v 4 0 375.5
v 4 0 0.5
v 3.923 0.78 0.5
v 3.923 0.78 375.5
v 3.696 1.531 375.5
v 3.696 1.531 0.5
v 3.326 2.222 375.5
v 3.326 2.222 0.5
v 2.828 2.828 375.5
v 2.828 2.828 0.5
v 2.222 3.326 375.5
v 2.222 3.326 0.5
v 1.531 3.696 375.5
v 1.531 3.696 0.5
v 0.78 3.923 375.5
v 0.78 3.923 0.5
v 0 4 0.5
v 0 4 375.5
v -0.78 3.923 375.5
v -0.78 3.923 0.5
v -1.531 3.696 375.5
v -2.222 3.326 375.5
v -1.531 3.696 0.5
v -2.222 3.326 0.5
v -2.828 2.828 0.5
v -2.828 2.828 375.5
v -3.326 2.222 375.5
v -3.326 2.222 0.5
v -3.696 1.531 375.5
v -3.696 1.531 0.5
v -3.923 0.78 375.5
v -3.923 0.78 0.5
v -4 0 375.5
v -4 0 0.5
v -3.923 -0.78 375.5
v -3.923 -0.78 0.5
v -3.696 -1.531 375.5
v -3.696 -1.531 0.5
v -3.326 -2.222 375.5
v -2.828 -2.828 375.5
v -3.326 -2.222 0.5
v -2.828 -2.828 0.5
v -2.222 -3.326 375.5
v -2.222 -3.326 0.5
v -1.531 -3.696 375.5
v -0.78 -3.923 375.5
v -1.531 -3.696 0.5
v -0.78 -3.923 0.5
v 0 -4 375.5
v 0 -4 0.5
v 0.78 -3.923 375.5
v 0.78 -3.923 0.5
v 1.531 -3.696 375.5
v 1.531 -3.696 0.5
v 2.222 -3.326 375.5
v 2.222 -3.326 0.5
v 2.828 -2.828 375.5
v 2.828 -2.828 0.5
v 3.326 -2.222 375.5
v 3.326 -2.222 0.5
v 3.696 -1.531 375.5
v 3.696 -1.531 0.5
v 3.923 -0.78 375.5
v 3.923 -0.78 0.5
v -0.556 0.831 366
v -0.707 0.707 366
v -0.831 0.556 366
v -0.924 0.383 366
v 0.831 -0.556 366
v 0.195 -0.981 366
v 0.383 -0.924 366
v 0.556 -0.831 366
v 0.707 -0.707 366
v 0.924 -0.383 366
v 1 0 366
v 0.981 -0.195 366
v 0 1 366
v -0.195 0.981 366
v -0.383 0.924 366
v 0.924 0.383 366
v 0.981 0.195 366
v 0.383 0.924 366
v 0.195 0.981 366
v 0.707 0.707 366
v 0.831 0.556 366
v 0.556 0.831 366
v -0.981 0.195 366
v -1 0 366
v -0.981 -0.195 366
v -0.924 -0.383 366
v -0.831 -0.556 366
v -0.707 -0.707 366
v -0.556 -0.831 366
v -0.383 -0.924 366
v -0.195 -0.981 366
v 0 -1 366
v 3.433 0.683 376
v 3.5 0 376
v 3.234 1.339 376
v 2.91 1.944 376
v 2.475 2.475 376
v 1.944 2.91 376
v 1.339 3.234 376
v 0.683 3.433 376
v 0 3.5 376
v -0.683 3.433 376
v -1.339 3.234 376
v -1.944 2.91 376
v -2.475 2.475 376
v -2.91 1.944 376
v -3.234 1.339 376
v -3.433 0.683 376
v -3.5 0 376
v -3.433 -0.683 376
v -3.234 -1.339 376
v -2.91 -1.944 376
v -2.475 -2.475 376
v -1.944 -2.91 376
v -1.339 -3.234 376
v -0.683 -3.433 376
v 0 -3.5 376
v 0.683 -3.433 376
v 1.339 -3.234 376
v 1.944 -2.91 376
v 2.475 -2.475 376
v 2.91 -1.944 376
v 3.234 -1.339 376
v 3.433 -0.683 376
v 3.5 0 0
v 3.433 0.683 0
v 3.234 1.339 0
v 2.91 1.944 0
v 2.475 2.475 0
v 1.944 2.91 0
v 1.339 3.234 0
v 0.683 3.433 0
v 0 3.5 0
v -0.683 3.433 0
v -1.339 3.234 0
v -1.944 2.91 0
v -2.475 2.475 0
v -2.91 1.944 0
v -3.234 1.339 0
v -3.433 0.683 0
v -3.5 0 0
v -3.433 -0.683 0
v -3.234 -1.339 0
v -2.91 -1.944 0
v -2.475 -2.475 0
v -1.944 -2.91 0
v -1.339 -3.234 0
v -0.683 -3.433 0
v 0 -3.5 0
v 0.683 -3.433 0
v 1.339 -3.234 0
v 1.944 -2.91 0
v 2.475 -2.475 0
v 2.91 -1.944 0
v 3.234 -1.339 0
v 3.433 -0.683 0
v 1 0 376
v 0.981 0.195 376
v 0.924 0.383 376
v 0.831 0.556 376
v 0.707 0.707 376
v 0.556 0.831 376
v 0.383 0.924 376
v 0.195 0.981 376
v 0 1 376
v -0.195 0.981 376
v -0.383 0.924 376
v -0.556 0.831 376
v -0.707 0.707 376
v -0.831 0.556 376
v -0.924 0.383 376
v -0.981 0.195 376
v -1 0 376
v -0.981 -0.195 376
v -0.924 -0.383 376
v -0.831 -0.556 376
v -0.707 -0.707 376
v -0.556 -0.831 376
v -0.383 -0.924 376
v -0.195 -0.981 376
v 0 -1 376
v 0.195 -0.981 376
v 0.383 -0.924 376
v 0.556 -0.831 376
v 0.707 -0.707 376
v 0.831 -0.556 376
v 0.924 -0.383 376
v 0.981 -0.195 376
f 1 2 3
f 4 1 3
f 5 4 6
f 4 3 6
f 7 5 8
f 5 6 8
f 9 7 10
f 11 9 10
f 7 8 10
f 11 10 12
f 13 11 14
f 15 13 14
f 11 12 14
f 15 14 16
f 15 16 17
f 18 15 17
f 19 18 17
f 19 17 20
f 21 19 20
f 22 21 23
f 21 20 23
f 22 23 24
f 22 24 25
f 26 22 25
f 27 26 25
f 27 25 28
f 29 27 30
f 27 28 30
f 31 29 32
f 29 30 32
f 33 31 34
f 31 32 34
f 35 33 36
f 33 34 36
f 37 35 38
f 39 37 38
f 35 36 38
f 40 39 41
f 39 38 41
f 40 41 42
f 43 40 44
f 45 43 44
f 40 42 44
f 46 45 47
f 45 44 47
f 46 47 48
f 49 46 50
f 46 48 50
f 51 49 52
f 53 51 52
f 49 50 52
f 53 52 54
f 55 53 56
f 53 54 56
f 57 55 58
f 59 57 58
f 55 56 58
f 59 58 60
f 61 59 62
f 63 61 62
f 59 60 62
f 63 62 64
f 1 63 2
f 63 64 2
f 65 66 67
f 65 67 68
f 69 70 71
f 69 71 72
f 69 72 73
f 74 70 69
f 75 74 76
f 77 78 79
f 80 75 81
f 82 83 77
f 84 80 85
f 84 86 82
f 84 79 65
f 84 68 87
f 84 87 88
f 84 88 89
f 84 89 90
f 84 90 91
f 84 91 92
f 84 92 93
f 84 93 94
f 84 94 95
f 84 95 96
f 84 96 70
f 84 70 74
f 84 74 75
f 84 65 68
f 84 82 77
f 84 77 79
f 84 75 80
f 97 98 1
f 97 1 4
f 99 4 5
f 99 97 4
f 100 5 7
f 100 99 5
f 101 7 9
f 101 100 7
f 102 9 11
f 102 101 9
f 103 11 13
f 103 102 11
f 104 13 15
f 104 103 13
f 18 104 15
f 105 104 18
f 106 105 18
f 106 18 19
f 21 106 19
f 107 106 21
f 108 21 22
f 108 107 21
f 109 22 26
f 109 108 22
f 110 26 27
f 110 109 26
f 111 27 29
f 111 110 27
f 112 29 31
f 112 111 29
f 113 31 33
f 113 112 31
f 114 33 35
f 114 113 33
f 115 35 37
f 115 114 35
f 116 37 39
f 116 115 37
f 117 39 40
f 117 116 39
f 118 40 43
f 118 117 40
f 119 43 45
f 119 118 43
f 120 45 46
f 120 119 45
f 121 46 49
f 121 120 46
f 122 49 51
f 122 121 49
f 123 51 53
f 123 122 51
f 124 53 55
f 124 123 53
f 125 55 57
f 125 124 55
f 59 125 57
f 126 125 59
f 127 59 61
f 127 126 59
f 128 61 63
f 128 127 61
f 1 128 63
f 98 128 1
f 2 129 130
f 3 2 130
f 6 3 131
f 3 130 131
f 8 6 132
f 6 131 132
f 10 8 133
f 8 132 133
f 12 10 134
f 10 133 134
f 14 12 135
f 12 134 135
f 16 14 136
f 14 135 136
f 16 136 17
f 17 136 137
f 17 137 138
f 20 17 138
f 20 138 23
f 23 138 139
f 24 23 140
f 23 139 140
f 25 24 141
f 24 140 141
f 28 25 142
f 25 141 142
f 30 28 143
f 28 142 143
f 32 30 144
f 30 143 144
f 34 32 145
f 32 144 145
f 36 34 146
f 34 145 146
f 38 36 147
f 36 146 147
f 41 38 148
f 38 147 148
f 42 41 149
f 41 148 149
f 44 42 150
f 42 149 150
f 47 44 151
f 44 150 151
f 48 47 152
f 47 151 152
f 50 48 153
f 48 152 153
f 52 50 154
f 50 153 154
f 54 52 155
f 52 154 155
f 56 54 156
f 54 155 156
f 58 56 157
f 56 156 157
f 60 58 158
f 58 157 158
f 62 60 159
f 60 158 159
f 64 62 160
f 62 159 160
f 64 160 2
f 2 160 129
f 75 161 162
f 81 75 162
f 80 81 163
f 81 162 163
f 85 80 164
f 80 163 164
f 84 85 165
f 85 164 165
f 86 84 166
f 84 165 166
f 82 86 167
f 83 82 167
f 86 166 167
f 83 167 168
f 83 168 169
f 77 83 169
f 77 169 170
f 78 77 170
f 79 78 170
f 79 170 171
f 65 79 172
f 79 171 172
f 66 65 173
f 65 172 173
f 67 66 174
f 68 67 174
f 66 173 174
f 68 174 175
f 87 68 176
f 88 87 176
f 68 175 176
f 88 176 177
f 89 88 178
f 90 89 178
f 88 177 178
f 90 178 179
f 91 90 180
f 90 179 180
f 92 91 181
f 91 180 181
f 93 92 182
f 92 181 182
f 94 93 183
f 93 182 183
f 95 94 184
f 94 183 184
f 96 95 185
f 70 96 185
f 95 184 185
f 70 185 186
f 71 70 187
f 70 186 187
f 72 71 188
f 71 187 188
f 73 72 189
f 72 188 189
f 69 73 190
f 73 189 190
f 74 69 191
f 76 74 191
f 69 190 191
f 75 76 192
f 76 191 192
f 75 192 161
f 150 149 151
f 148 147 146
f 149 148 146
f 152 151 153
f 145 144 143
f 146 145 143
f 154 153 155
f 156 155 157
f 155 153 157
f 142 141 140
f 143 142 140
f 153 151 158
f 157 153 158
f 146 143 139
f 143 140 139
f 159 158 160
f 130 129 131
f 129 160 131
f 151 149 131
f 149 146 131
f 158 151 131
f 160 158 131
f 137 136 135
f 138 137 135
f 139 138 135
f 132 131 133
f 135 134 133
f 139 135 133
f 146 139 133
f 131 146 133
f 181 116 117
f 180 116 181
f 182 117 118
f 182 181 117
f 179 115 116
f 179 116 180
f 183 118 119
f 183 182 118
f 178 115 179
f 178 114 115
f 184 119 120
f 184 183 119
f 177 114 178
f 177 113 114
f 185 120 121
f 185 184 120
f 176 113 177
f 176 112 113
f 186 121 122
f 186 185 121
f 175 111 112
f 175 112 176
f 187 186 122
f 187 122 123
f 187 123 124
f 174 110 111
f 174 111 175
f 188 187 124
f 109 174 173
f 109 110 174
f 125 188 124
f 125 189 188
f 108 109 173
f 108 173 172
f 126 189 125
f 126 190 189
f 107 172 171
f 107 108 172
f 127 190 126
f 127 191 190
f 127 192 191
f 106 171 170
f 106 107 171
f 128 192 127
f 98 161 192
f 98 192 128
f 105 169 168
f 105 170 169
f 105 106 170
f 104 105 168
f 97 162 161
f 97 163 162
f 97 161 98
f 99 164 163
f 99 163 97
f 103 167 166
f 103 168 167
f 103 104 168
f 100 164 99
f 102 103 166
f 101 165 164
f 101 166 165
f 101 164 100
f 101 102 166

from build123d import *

# Parameters (mm, degrees)
SKETCH1_R           = 4
BOSS_EXTRUDE1_DEPTH = 376
SKETCH2_R           = 1
CUT_EXTRUDE1_DEPTH  = 10
CHAMFER1_SIZE       = 0.5


with BuildPart() as part:
    # Sketch1 → Boss-Extrude1 (new body)
    with BuildSketch(Plane.XY):
        Circle(SKETCH1_R)
    extrude(amount=BOSS_EXTRUDE1_DEPTH)

    # Sketch2 → Cut-Extrude1 (cut)
    with BuildSketch(Plane.XY.offset(376)):
        Circle(SKETCH2_R)
    extrude(amount=-CUT_EXTRUDE1_DEPTH, mode=Mode.SUBTRACT)

    # Chamfer1
    chamfer1_edges = [part.edges().sort_by_distance(p)[0] for p in [
        (-4, 0, 0),
        (-4, 0, 376),
    ]]
    chamfer(chamfer1_edges, length=CHAMFER1_SIZE)


solid = part.part
